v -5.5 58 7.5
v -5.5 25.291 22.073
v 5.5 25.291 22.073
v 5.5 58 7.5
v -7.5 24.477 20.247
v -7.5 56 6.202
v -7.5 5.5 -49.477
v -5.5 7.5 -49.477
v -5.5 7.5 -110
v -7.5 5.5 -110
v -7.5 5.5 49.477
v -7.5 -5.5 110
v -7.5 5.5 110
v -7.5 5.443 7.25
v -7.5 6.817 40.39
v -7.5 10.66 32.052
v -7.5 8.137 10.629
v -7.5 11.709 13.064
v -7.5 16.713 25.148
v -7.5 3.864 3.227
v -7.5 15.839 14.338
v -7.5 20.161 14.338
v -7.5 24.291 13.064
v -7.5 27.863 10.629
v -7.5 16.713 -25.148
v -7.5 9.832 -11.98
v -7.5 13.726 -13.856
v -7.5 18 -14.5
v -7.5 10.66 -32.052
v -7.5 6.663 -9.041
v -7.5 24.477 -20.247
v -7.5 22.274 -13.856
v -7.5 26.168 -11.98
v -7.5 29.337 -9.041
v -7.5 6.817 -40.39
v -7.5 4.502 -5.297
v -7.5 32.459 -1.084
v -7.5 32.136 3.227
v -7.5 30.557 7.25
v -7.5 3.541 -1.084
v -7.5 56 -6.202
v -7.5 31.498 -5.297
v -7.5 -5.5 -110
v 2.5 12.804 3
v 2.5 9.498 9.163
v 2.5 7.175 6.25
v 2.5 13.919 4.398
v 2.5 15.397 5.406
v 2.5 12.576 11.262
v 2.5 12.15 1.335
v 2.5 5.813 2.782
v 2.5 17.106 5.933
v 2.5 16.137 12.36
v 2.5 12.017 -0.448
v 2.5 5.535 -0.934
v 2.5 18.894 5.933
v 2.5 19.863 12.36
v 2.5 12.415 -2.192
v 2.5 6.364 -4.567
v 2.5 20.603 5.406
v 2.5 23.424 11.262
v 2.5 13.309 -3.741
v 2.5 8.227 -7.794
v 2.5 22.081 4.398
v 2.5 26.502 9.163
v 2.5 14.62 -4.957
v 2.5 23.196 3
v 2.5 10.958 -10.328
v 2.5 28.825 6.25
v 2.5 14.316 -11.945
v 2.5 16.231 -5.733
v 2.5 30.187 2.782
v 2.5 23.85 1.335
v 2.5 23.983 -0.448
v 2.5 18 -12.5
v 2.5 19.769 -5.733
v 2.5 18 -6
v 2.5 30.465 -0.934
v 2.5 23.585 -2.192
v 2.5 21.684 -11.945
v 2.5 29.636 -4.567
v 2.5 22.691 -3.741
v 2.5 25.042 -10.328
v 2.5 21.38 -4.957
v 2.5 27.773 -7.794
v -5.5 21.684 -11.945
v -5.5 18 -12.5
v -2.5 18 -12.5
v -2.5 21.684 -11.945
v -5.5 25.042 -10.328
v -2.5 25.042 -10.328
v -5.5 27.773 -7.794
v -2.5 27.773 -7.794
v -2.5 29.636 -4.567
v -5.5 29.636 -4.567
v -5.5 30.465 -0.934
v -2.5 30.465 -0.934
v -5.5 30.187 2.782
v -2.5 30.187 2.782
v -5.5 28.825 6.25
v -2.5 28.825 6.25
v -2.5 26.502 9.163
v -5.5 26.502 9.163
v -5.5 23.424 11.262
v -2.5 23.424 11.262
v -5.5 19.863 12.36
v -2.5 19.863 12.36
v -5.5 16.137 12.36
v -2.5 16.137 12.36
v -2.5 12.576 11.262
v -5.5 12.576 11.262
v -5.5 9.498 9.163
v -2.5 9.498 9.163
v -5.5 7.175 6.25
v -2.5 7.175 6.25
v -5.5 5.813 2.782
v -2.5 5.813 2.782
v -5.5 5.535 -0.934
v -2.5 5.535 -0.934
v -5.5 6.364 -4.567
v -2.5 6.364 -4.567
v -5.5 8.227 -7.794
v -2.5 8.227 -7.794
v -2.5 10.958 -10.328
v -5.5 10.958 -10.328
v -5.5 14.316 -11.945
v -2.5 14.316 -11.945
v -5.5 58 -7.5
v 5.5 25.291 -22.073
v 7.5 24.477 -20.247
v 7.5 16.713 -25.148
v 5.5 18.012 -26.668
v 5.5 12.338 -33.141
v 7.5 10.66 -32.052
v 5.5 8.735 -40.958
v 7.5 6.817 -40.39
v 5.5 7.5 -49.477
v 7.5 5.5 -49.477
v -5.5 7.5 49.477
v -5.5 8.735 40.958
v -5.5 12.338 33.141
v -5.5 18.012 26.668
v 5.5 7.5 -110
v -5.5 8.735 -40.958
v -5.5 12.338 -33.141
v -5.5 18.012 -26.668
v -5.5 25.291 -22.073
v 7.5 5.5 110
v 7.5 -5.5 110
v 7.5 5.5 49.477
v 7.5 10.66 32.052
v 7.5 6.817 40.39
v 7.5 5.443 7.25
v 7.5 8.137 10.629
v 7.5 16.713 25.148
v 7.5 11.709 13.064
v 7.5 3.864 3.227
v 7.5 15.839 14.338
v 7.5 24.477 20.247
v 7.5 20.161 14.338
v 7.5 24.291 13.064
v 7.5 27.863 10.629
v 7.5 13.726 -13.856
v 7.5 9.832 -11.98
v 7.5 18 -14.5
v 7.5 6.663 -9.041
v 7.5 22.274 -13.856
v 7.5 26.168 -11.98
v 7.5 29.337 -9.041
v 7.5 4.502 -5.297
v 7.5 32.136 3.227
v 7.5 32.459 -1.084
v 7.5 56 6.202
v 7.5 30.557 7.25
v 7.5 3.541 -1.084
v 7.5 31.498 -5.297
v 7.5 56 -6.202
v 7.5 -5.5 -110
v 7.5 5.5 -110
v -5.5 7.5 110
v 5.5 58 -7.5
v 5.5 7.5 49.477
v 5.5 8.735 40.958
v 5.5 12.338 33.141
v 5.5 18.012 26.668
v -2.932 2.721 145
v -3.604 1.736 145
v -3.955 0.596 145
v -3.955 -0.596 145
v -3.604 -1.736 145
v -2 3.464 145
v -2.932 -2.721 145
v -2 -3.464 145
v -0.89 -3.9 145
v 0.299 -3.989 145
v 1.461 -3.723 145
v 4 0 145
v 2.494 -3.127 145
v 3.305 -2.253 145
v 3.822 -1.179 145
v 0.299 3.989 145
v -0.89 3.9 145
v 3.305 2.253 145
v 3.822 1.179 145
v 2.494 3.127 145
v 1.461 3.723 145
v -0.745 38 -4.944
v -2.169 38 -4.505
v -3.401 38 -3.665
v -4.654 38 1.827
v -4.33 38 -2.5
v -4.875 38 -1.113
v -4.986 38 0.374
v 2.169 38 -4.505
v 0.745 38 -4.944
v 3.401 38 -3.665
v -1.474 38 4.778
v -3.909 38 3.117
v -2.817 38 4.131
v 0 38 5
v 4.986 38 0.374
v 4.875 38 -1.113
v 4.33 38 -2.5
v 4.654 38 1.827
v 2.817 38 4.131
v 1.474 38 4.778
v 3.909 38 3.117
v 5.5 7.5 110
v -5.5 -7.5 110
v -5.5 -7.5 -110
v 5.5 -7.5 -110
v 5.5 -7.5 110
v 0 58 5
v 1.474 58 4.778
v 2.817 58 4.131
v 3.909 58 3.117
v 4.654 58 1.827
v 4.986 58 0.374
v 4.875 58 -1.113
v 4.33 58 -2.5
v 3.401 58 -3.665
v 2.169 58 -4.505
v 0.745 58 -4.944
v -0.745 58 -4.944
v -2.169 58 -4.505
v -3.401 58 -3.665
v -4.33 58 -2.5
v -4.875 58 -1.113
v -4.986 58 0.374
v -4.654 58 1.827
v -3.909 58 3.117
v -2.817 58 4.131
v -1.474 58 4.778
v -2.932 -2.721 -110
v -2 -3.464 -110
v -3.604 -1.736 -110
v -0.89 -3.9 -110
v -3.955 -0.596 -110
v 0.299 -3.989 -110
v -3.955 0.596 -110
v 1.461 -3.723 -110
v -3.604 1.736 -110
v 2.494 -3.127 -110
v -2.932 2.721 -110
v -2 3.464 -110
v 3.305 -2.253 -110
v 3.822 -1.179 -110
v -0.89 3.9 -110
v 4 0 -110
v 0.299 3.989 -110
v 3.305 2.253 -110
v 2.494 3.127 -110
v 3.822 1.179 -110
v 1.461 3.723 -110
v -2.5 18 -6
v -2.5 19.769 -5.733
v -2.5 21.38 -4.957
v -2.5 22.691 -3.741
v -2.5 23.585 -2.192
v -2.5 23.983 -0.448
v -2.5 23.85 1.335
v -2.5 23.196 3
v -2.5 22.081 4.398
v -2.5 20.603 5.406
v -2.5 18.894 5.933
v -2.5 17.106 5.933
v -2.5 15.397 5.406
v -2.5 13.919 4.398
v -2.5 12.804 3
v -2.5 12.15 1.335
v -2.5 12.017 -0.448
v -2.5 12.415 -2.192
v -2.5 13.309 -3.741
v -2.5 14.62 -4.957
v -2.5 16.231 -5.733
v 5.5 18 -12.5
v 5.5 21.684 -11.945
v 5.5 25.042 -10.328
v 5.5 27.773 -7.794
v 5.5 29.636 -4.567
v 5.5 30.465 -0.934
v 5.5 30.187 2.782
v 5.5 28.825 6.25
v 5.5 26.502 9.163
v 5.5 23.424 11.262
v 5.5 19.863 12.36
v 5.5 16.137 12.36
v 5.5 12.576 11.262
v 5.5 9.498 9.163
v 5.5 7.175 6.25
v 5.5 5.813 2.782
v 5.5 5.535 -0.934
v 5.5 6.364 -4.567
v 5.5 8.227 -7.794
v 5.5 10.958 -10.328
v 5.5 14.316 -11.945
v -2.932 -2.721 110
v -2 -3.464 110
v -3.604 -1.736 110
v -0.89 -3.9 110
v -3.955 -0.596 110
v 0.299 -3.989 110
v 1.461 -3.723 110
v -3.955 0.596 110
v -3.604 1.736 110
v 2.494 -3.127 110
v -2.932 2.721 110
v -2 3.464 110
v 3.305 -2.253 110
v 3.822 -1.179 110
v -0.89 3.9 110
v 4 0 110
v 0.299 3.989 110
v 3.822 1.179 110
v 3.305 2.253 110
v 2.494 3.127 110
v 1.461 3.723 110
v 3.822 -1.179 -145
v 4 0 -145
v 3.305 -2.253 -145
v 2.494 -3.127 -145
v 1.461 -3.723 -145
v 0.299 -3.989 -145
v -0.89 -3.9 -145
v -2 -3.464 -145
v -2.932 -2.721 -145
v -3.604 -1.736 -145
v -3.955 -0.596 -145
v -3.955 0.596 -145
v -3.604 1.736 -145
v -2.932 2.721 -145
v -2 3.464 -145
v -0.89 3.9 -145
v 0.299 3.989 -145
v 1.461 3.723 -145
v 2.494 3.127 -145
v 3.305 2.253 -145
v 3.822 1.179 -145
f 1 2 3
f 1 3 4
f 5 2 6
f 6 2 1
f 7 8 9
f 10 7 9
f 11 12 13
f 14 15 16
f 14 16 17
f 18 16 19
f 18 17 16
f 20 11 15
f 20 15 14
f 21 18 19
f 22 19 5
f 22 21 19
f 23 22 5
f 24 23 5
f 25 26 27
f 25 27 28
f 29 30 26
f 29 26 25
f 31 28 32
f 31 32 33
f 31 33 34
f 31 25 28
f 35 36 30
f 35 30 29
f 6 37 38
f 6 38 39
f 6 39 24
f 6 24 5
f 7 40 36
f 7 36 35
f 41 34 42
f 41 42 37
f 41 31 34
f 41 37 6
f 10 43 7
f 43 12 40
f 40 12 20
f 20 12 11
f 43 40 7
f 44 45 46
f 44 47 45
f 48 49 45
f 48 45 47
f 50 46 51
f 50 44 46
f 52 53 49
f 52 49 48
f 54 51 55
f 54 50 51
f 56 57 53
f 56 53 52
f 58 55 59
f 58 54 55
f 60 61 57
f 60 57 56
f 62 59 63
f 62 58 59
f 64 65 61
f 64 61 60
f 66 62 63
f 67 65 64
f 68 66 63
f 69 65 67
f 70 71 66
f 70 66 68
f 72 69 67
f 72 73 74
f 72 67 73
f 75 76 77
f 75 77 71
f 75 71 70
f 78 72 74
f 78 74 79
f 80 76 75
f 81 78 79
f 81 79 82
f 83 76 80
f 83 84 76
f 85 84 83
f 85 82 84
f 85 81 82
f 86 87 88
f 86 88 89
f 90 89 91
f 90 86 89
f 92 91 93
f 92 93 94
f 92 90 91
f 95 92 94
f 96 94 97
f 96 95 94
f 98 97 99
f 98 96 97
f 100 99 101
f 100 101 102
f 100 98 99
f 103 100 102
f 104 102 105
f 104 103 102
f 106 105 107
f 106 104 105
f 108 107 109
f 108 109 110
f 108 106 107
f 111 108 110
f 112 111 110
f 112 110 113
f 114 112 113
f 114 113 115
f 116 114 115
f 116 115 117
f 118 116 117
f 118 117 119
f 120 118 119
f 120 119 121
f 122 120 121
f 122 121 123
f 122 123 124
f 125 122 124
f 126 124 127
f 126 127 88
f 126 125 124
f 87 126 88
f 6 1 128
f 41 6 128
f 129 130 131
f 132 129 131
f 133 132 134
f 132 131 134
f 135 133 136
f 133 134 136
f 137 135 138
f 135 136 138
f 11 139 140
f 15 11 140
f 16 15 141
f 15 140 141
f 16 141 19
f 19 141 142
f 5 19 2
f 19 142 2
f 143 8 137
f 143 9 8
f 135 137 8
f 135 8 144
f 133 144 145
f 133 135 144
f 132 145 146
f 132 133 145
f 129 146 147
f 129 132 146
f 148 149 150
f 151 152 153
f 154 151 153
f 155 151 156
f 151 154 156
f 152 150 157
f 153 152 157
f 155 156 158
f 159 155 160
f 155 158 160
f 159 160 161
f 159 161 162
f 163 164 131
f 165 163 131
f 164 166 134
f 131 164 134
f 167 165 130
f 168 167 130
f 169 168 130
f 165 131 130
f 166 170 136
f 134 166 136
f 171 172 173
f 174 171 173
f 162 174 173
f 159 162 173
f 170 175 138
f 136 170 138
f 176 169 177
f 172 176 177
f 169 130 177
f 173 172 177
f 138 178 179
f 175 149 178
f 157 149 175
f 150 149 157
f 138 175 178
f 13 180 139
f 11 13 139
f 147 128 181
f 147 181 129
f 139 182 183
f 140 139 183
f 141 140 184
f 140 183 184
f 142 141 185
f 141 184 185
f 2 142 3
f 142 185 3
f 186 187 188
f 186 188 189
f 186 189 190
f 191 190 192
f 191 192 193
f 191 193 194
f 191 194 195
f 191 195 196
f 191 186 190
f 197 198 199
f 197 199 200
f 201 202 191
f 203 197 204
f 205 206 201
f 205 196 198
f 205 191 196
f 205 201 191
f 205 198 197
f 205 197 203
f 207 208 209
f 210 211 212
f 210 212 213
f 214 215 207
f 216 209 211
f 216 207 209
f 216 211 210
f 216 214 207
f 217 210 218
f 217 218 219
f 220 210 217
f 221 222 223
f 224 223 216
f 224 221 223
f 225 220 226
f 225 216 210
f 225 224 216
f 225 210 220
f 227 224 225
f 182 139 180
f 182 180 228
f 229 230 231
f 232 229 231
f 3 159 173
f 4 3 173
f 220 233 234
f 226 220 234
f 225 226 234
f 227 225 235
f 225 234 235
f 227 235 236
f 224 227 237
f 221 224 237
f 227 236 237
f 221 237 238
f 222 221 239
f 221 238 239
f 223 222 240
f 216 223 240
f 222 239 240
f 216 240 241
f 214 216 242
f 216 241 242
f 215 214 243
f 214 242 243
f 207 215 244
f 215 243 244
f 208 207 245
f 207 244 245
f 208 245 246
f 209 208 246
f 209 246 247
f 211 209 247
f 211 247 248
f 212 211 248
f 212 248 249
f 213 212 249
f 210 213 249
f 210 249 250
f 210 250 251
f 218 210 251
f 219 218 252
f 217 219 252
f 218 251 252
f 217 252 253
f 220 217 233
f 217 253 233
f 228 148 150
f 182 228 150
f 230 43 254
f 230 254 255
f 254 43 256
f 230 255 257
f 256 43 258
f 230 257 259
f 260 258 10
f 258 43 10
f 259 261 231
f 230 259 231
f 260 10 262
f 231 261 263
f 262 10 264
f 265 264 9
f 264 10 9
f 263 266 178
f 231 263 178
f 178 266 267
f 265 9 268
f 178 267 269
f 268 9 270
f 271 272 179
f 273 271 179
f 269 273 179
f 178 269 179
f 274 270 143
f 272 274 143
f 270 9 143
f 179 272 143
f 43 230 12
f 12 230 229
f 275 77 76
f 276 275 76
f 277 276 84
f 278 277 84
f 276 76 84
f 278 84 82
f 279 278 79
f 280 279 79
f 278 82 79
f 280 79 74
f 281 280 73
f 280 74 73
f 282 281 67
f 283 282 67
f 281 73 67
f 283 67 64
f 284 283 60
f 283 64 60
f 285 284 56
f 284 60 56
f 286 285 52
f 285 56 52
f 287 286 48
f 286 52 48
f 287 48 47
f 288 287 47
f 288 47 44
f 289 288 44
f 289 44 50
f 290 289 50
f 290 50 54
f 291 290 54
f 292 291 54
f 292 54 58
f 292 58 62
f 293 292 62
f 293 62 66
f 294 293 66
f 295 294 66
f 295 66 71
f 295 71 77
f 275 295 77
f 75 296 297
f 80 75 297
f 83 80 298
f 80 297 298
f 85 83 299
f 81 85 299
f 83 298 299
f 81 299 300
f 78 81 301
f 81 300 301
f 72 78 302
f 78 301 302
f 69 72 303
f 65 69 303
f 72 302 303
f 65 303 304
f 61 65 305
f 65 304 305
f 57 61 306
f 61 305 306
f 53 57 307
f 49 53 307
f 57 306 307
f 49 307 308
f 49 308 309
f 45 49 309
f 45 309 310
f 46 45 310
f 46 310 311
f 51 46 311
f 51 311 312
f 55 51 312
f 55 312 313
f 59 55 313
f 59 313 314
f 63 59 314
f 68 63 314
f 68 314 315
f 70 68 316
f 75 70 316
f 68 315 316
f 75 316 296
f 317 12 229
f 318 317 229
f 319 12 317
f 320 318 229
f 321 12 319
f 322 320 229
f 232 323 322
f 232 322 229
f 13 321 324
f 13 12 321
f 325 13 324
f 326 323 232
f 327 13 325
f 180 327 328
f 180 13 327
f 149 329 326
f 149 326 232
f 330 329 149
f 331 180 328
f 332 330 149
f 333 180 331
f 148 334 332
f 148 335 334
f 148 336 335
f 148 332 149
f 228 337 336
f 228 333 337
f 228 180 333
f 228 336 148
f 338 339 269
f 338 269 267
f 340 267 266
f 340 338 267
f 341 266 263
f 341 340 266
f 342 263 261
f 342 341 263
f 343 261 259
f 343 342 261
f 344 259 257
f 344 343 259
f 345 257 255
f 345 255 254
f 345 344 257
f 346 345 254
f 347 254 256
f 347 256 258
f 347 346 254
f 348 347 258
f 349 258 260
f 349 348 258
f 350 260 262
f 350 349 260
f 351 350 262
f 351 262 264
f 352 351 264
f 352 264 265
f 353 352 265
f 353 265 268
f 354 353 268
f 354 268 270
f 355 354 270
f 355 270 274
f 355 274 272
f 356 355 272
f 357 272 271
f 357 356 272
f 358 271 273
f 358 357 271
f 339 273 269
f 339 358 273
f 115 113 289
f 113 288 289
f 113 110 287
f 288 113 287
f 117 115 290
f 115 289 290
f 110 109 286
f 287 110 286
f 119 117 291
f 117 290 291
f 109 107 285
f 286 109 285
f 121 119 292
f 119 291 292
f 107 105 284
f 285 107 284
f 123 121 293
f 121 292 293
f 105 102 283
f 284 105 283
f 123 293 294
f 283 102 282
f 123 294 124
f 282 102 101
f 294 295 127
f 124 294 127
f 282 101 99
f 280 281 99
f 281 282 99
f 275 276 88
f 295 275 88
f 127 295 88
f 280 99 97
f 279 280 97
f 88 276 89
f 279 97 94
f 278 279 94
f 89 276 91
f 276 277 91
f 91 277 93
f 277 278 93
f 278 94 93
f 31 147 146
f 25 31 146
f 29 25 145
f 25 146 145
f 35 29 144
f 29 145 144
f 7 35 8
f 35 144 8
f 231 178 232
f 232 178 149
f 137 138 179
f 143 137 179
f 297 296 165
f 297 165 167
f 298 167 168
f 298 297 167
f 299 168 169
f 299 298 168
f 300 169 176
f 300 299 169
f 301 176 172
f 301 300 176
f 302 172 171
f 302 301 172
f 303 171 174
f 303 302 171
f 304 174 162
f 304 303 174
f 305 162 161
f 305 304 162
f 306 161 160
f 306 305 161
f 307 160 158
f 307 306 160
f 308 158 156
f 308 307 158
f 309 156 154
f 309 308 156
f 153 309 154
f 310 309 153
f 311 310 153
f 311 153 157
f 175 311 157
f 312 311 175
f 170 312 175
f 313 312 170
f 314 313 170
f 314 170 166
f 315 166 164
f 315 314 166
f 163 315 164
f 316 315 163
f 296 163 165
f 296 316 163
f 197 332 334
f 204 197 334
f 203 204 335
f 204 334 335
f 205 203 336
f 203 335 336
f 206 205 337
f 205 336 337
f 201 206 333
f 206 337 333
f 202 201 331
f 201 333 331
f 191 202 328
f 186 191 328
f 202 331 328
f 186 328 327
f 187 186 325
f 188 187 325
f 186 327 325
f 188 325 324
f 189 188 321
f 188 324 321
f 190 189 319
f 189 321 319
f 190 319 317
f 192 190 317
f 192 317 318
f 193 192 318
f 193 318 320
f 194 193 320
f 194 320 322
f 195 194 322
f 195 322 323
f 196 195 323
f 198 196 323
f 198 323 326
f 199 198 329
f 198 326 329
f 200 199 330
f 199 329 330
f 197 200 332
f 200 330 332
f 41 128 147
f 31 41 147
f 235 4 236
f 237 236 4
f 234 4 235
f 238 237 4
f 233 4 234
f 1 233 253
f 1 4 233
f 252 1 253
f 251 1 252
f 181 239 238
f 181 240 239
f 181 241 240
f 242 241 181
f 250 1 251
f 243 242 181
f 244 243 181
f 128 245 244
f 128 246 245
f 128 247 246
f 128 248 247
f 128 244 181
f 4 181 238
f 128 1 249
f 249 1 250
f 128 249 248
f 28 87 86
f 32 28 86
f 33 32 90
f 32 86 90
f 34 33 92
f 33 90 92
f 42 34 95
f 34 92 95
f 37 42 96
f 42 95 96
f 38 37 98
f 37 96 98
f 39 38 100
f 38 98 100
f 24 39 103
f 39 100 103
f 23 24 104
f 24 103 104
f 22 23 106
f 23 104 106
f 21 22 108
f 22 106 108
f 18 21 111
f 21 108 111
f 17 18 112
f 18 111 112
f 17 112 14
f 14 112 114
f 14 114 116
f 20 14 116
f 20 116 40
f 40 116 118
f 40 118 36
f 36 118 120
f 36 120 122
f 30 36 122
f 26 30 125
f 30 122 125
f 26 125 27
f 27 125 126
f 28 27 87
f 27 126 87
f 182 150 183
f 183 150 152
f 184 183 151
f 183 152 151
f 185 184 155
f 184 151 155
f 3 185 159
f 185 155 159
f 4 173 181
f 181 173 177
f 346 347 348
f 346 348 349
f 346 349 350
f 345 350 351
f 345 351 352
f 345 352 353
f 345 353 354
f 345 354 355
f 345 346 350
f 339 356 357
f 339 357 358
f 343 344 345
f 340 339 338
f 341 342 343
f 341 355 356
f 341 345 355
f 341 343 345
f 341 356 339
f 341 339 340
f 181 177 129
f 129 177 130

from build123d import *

# Parameters (mm, degrees)
BOSS_EXTRUDE1_DEPTH      = 110
BOSS_EXTRUDE1_DEPTH_BACK = 110
SKETCH1_W                = 15
SKETCH1_H                = 15
SKETCH2_R                = 4
BOSS_EXTRUDE2_DEPTH      = 35
BOSS_EXTRUDE3_START      = 35
SKETCH3_R                = 4
BOSS_EXTRUDE3_DEPTH      = 35
BOSS_EXTRUDE4_DEPTH      = 7.5
BOSS_EXTRUDE4_DEPTH_BACK = 7.5
SKETCH5_R                = 6
CUT_EXTRUDE1_DEPTH       = 157.888495435
SKETCH6_R                = 5
CUT_EXTRUDE5_DEPTH       = 20
SKETCH7_R                = 12.5
CUT_EXTRUDE2_DEPTH       = 5
FILLET2_R                = 30
CHAMFER1_SIZE            = 2


with BuildPart() as part:
    # Sketch1 → Boss-Extrude1 (new, two sides: drawn at the far end of the back side and taken through both)
    with BuildSketch(Plane.XY.offset(-BOSS_EXTRUDE1_DEPTH_BACK)):
        Rectangle(SKETCH1_W, SKETCH1_H)
    extrude(amount=BOSS_EXTRUDE1_DEPTH + BOSS_EXTRUDE1_DEPTH_BACK)

    # Sketch2 → Boss-Extrude2 (add)
    with BuildSketch(Plane.XY.offset(110)):
        Circle(SKETCH2_R)
    extrude(amount=BOSS_EXTRUDE2_DEPTH)

    # Sketch3 → Boss-Extrude3 (add)
    with BuildSketch(Plane(origin=(0, 0, -110), x_dir=(-1, 0, 0), z_dir=(0, 0, -1)).offset(BOSS_EXTRUDE3_START)):
        with Locations(Location((0, 0, 0), (0, 0, 180))):
            Circle(SKETCH3_R)
    extrude(amount=-BOSS_EXTRUDE3_DEPTH)

    # Sketch4 → Boss-Extrude4 (add, two sides: drawn at the far end of the back side and taken through both)
    with BuildSketch(Plane(origin=(0, 0, 0), x_dir=(0, 0, -1), z_dir=(1, 0, 0)).offset(-BOSS_EXTRUDE4_DEPTH_BACK)):
        Polygon((-30, 7.5), (-7.5, 58), (7.5, 58), (30, 7.5), align=None)
    extrude(amount=BOSS_EXTRUDE4_DEPTH + BOSS_EXTRUDE4_DEPTH_BACK)

    # Sketch5 → Cut-Extrude1 (cut, through all)
    with BuildSketch(Plane(origin=(7.5, 0, 0), x_dir=(0, 0, -1), z_dir=(1, 0, 0))):
        with Locations((0, 18)):
            Circle(SKETCH5_R)
    extrude(amount=-CUT_EXTRUDE1_DEPTH, mode=Mode.SUBTRACT)

    # Sketch6 → Cut-Extrude5 (cut)
    with BuildSketch(Plane(origin=(0, 58, 0), x_dir=(1, 0, 0), z_dir=(0, 1, 0))):
        with Locations(Location((0, 0, 0), (0, 0, 270))):
            Circle(SKETCH6_R)
    extrude(amount=-CUT_EXTRUDE5_DEPTH, mode=Mode.SUBTRACT)

    # Sketch7 → Cut-Extrude2 (cut)
    with BuildSketch(Plane(origin=(7.5, 0, 0), x_dir=(0, 0, -1), z_dir=(1, 0, 0))):
        with Locations((0, 18)):
            Circle(SKETCH7_R)
    cut_extrude2 = extrude(amount=-CUT_EXTRUDE2_DEPTH, mode=Mode.SUBTRACT)

    # Mirror1: Cut-Extrude2 across plane
    add(cut_extrude2.mirror(Plane(origin=(0, 0, 0), x_dir=(0, 0, 1), z_dir=(1, 0, 0))), mode=Mode.SUBTRACT)

    # Fillet2
    fillet2_edges = [part.edges().sort_by_distance(p)[0] for p in [
        (0, 7.5, -30),
        (0, 7.5, 30),
    ]]
    fillet(fillet2_edges, radius=FILLET2_R)

    # Chamfer1
    chamfer1_edges = [part.edges().sort_by_distance(p)[0] for p in [
        (-7.5, 41.645338647, 14.786730306),
        (-7.5, 58, 0),
        (7.5, 58, 0),
        (7.5, 41.645338647, 14.786730306),
        (7.5, 18, 12.5),
        (-7.5, 18, 12.5),
        (7.5, 41.645338647, -14.786730306),
        (-7.5, 41.645338647, -14.786730306),
        (-7.5, 7.5, 79.738303565),
        (-7.5, 7.5, -79.738303565),
        (7.5, 7.5, 79.738303565),
        (7.5, 7.5, -79.738303565),
        (7.5, 12.33772982, -33.140752104),
        (-7.5, 12.33772982, -33.140752104),
        (7.5, -7.5, 0),
        (7.5, 12.33772982, 33.140752104),
        (-7.5, 12.33772982, 33.140752104),
        (-7.5, -7.5, 0),
    ]]
    chamfer(chamfer1_edges, length=CHAMFER1_SIZE)


solid = part.part
